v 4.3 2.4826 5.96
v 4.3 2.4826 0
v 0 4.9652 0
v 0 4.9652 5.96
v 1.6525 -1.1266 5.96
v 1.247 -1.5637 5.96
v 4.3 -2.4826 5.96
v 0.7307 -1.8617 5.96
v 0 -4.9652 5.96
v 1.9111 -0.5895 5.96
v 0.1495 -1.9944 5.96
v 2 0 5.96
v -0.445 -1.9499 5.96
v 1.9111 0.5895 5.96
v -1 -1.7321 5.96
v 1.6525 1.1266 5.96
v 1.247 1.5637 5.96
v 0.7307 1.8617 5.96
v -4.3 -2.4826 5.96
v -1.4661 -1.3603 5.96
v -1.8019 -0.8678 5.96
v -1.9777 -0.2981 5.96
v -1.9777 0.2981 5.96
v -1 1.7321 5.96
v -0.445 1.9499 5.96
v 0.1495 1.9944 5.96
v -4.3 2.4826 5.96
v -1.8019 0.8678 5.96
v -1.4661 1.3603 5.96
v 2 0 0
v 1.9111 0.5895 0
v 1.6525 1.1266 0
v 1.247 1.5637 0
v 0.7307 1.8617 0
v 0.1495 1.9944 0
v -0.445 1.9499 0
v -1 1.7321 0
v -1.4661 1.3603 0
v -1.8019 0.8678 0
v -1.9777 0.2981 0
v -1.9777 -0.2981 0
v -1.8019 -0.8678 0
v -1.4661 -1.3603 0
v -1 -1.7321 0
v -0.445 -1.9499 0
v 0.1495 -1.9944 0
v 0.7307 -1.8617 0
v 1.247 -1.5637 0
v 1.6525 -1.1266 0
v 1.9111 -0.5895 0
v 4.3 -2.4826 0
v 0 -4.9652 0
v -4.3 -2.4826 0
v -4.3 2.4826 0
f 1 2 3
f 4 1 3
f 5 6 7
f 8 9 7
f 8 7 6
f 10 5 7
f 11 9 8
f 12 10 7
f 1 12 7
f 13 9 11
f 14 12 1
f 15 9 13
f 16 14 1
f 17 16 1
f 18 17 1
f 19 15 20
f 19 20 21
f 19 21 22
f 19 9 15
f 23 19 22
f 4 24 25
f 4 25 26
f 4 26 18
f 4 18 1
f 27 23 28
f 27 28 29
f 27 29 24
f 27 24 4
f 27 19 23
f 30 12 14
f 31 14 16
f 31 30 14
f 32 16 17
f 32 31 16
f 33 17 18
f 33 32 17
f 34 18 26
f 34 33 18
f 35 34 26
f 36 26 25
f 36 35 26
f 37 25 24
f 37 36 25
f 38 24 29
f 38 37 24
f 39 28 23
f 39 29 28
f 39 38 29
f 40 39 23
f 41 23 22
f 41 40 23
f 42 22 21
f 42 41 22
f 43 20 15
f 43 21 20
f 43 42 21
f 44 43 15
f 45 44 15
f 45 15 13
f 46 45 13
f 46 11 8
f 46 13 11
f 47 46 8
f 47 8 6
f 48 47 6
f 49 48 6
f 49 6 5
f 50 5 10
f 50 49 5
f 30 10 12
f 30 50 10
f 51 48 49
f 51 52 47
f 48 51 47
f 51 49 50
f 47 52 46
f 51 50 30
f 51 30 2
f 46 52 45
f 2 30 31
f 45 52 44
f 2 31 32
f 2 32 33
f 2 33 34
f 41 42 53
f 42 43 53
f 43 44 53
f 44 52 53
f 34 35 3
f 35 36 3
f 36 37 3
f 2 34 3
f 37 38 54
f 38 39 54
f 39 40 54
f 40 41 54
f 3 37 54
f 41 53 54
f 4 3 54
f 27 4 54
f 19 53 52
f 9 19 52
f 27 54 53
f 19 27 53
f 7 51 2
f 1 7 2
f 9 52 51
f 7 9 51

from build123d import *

# Parameters (mm, degrees)
BOSS_EXTRUDE1_DEPTH = 5.96
CUT_EXTRUDE1_REACH  = 10.869
SKETCH2_R           = 2


with BuildPart() as part:
    # Sketch1 → Boss-Extrude1 (new body)
    with BuildSketch(Plane(origin=(0, 0, 0), x_dir=(0, 1, 0), z_dir=(0, 0, 1))):
        Polygon((4.965212315, 0), (2.482606158, 4.3), (-2.482606158, 4.3), (-4.965212315, 0), (-2.482606158, -4.3), (2.482606158, -4.3), align=None)
    extrude(amount=BOSS_EXTRUDE1_DEPTH)

    # Sketch2 → Cut-Extrude1 (cut, up to next)
    with BuildSketch(Plane(origin=(0, 0, 0), x_dir=(0, 1, 0), z_dir=(0, 0, 1)), mode=Mode.PRIVATE) as cut_extrude1_sk1:
        with Locations(Location((0, 0, 0), (0, 0, 270))):
            Circle(SKETCH2_R)
    cut_extrude1_tool1 = extrude(cut_extrude1_sk1.sketch, amount=CUT_EXTRUDE1_REACH, mode=Mode.PRIVATE) & part.part
    add(cut_extrude1_tool1.solids().sort_by_distance((0, 0, 0))[0], mode=Mode.SUBTRACT)


solid = part.part
